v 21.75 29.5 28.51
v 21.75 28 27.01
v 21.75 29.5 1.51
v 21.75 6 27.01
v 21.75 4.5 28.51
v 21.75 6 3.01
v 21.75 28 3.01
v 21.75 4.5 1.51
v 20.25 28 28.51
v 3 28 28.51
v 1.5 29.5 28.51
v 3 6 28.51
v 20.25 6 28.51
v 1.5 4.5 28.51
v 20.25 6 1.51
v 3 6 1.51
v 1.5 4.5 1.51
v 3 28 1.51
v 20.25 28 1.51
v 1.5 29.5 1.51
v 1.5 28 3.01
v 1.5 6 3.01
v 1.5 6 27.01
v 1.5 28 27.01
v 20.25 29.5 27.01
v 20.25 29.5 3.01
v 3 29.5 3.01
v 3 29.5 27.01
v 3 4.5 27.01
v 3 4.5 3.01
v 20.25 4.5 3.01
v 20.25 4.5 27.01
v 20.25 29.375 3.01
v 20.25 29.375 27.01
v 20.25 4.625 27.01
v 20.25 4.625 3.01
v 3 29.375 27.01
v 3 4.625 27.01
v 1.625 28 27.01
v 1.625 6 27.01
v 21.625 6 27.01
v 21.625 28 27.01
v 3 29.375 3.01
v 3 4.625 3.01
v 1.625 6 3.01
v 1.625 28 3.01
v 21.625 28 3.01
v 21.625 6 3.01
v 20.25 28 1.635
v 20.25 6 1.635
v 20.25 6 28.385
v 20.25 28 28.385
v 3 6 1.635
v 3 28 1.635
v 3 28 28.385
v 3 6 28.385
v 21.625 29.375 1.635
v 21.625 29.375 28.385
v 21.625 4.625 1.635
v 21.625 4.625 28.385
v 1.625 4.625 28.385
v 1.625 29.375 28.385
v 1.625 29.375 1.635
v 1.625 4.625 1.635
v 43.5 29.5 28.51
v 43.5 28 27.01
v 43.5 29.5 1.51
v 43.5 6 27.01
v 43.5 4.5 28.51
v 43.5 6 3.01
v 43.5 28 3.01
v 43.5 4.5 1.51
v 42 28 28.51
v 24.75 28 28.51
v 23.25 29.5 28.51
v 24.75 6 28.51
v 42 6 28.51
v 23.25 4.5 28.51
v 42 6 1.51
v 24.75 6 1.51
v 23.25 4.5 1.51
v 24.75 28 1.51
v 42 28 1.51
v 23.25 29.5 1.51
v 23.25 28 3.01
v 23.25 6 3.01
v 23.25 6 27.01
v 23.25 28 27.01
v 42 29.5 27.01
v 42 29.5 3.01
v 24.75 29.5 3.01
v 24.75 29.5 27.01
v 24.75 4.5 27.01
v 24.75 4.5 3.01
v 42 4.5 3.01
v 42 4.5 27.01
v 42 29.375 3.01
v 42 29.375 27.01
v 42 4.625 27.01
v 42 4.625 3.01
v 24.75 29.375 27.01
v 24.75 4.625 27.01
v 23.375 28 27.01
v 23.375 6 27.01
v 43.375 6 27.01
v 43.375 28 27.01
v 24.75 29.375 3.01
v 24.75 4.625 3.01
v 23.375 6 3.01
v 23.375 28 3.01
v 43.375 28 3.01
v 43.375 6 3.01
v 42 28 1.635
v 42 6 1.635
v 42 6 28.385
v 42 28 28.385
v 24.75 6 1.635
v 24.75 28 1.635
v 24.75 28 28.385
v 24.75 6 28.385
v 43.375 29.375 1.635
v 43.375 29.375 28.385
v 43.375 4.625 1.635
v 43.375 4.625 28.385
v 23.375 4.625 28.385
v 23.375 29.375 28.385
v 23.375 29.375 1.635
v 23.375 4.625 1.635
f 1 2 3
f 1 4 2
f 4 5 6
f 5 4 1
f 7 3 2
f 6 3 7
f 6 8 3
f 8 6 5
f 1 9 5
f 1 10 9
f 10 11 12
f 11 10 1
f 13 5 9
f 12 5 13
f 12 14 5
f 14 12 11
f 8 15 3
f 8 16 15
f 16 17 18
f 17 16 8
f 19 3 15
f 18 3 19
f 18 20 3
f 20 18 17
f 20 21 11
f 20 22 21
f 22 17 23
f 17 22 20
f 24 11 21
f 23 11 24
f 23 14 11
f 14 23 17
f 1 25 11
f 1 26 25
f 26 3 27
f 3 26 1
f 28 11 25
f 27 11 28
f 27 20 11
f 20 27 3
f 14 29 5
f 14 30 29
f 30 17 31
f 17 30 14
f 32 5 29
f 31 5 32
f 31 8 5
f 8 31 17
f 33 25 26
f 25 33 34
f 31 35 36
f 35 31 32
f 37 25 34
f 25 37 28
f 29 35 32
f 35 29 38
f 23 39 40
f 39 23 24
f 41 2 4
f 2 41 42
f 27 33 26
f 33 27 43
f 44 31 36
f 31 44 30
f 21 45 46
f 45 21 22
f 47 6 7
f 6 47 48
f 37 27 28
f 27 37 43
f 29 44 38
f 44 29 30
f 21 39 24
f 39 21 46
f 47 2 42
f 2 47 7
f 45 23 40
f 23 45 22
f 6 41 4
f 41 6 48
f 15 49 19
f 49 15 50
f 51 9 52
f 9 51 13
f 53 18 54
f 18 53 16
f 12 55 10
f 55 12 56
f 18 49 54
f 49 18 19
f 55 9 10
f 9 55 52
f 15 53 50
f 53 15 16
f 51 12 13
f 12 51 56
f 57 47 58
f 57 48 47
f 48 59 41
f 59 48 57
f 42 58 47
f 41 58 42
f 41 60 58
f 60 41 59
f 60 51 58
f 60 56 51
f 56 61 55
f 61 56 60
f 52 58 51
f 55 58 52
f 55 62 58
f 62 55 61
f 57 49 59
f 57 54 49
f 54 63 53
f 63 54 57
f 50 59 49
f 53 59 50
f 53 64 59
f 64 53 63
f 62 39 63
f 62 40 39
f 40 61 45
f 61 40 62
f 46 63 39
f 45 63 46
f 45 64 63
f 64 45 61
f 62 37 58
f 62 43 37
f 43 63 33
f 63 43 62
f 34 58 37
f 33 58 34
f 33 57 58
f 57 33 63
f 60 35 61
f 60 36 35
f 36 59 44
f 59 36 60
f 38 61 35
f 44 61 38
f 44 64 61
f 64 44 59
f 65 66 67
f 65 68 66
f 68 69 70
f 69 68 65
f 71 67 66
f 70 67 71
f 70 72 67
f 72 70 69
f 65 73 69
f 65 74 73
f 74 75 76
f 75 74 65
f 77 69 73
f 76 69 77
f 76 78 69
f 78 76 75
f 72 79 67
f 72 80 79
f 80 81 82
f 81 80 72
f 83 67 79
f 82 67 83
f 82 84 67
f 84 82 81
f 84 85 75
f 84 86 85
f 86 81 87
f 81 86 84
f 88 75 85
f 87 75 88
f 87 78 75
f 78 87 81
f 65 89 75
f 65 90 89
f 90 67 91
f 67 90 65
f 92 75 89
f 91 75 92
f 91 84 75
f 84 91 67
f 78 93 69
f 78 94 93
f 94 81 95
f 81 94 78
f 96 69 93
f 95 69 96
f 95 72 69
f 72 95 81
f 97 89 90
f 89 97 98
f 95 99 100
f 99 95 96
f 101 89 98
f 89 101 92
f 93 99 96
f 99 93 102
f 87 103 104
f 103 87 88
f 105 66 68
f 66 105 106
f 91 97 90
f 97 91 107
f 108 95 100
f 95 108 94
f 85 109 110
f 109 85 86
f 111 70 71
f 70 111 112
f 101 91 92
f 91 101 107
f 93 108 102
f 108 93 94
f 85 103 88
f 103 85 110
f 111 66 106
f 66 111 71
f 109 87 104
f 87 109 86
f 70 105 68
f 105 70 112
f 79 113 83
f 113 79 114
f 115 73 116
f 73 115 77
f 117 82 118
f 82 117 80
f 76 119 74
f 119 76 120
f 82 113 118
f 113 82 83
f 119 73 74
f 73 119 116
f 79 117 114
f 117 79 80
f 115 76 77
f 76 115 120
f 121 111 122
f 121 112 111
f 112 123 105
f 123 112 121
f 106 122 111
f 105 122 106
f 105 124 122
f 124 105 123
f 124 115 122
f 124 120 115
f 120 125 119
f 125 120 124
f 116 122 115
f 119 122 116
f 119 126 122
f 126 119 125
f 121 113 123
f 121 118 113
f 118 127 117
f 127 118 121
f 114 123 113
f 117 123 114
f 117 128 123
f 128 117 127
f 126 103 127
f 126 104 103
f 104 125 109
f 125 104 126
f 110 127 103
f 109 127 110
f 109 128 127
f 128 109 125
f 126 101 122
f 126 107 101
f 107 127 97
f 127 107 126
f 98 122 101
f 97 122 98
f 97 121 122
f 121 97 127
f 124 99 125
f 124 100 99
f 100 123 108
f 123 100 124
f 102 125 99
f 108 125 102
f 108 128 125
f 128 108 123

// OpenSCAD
rack_width = 20.25;
rack_depth = 25;
rack_height = 27;

front_vent_depth = 3;

door_hinge_gap = 0.063;
door_handle_gap = 0.25;
door_top_gap = door_handle_gap;
door_bottom_gap = door_handle_gap;

profile_base_dimension = 1.5;

enclosure_width = 45;
enclosure_depth = rack_depth + front_vent_depth + (profile_base_dimension * 2);
enclosure_height = rack_height + (profile_base_dimension * 2);

// Derivatives
enclosure_half_width = enclosure_width / 2;
profile_half_dimension = profile_base_dimension / 2;
parts_b_and_e_length = rack_depth - (profile_base_dimension * 2);
rack_base_y_offset = profile_base_dimension + front_vent_depth;
top_frame_z_offset = enclosure_height - profile_base_dimension;
total_horizontal_door_gap = door_handle_gap + door_hinge_gap;
total_vertical_door_gap = door_top_gap + door_bottom_gap;
door_width = rack_width - total_horizontal_door_gap;
door_height = enclosure_height - (profile_base_dimension * 2) - total_vertical_door_gap;

module extrude_8020(profile, length) {
  linear_extrude(height = length, center = true) {
    import(str("vendor/8020/", profile, ".dxf"));
  }
}

module server_rack() {
  rack_frame_dimension = 1.5;
  wall_thickness = 0.125;
  fudge_factor = 0.01; // To eliminate z-fighting

  color("Gray", alpha = 1)
  difference() {
    cube([rack_width, rack_depth, rack_height]);
    
    // Cut out front and back
    translate([rack_frame_dimension, -(fudge_factor / 2), rack_frame_dimension]) {
      cube([
        (rack_width - (rack_frame_dimension * 2)),
        (rack_depth + fudge_factor),
        (rack_height - (rack_frame_dimension * 2))
      ]);
    }
    
    // Cut out left and right
    translate([-(fudge_factor / 2), rack_frame_dimension, rack_frame_dimension]) {
      cube([
        (rack_width + fudge_factor),
        (rack_depth - (rack_frame_dimension * 2)),
        (rack_height - (rack_frame_dimension * 2))
      ]);
    }
    
    // Cut out top and bottom
    translate([rack_frame_dimension, rack_frame_dimension, -(fudge_factor / 2)]) {
      cube([
        (rack_width - (rack_frame_dimension * 2)),
        (rack_depth - (rack_frame_dimension * 2)),
        (rack_height + fudge_factor)
      ]);
    }
    
    // Cut interior to emulate L-profile frame
    translate([wall_thickness, wall_thickness, wall_thickness]) {
      cube([
        (rack_width - (wall_thickness * 2)),
        (rack_depth - (wall_thickness * 2)),
        (rack_height - (wall_thickness * 2))
      ]);
    }
  }
}

module server_rack_part_a() {
  translate([enclosure_half_width, profile_base_dimension, profile_half_dimension])
  rotate([90, 0, 90])
  extrude_8020("1530-LS", enclosure_width);
}

module server_rack_part_b() {
  length = parts_b_and_e_length;
  
  color("DodgerBlue")
  translate([profile_base_dimension, (length / 2), profile_half_dimension])
  rotate([90, 0, 0])
  extrude_8020("1530-LS", length);
}

module server_rack_part_c() {
  color("LimeGreen")
  translate([enclosure_half_width, profile_half_dimension, profile_half_dimension])
  rotate([0, 90, 0])
  extrude_8020("1515-LS", enclosure_width);
}

module server_rack_part_d() {
  length = front_vent_depth;
  
  color("Violet")
  translate([profile_half_dimension, (length / 2), profile_half_dimension])
  rotate([0, 90, 90])
  extrude_8020("1515-LS", length);
}

module server_rack_part_e() {
  length = parts_b_and_e_length;
  width = profile_base_dimension * 3;
  
  color("Tomato")
  translate([(width / 2), (length / 2), profile_half_dimension])
  rotate([90, 0, 0])
  extrude_8020("1545-S", length);
}

module server_rack_part_g() {
  length = rack_height;
  
  color("MediumSlateBlue")
  translate([profile_half_dimension, profile_half_dimension, (length / 2)])
  extrude_8020("1515-LS", length);
}

module server_rack_part_i() {
  length = enclosure_depth - (profile_base_dimension * 2);
  
  color("LightCoral")
  translate([profile_half_dimension, (length / 2), profile_half_dimension])
  rotate([90, 0, 0])
  extrude_8020("1515-LS", length);
}

module server_rack_part_j() {
  length = rack_height - total_vertical_door_gap;
  
  translate([profile_half_dimension, profile_half_dimension, (length / 2)])
  extrude_8020("1515-LS", length);
}

module server_rack_part_k() {
  length = rack_width - total_horizontal_door_gap - (profile_base_dimension * 2);
  
  translate([(length / 2), profile_half_dimension, profile_half_dimension])
  rotate([0, 90, 0])
  extrude_8020("1515-LS", length);
}

module server_rack_door() {
  top_bottom_frame_x_offset = profile_base_dimension;
  bottom_frame_z_offset = door_height - profile_base_dimension;
  right_frame_x_offset = door_width - profile_base_dimension;
  
  // Frame top and bottom
  translate([top_bottom_frame_x_offset, 0, bottom_frame_z_offset]) server_rack_part_k();
  translate([top_bottom_frame_x_offset, 0, 0]) server_rack_part_k();
  
  // Frame left and right
  server_rack_part_j();
  translate([right_frame_x_offset, 0, 0]) server_rack_part_j();
}

module server_rack_front_doors() {
  door_z_offset = profile_base_dimension + door_bottom_gap;
  left_door_x_offset = profile_base_dimension + door_hinge_gap;
  right_door_x_offset = enclosure_width - profile_base_dimension - door_hinge_gap;
  translate([left_door_x_offset, 0, door_z_offset]) server_rack_door();
  translate([right_door_x_offset, 0, door_z_offset]) mirror([1, 0, 0]) server_rack_door();
}

// Front Vent Base
union() {
  server_rack_part_c();
  
  for (x = [profile_base_dimension, (enclosure_half_width + profile_half_dimension), enclosure_width]) {
    translate([(x - profile_base_dimension), profile_base_dimension, 0]) server_rack_part_d();
  }
}

// Rack Base
translate([0, rack_base_y_offset, 0]) {
  union() {
    parts_b_and_e_y_offset = profile_base_dimension;
    part_a_y_offset = parts_b_and_e_y_offset + parts_b_and_e_length;
    
    server_rack_part_c();
    
    for (x = [(profile_base_dimension * 2), enclosure_width]) {
      translate([(x - profile_base_dimension * 2), parts_b_and_e_y_offset, 0]) server_rack_part_b();
    }
    
    translate([(enclosure_width / 2 - (profile_base_dimension * 3 / 2)), parts_b_and_e_y_offset, 0]) {
      server_rack_part_e();
    }
    
    translate([0, part_a_y_offset, 0]) server_rack_part_a();
  }
}

// Legs
translate([0, 0, profile_base_dimension]) {
  union() {
    evenly_spaced_offsets = [
      0,
      (enclosure_half_width - profile_half_dimension),
      (enclosure_width - profile_base_dimension)
    ];
    
    // Rear
    rear_legs_y_offset = enclosure_depth - profile_base_dimension;
    translate([0, rear_legs_y_offset, 0]) {
      for (x = evenly_spaced_offsets) {
        translate([x, 0, 0]) server_rack_part_g();
      }
    }
    
    // Front
    for (x = evenly_spaced_offsets) {
      translate([x, 0, 0]) server_rack_part_g();
    }
  }
}

// Racks
fudge_factor = 0.01; // To eliminate z-fighting
translate([0, rack_base_y_offset, profile_base_dimension + fudge_factor]) {
  translate([profile_base_dimension, 0, 0]) server_rack();
  translate([(enclosure_width - rack_width - profile_base_dimension), 0, 0]) server_rack();
}

// Top Frame
translate([0, 0, top_frame_z_offset]) {
  union() {
    server_rack_part_c();
    translate([0, (enclosure_depth - profile_base_dimension), 0]) server_rack_part_c();
    
    translate([0, profile_base_dimension, 0]) {
      for (x = [0, (enclosure_width / 2 - profile_half_dimension), (enclosure_width - profile_base_dimension)]) {
        translate([x, 0, 0]) server_rack_part_i();
      }
    }
  }
}

// Doors
union() {
  server_rack_front_doors();
  translate([0, (enclosure_depth - profile_base_dimension), 0]) server_rack_front_doors();
}
